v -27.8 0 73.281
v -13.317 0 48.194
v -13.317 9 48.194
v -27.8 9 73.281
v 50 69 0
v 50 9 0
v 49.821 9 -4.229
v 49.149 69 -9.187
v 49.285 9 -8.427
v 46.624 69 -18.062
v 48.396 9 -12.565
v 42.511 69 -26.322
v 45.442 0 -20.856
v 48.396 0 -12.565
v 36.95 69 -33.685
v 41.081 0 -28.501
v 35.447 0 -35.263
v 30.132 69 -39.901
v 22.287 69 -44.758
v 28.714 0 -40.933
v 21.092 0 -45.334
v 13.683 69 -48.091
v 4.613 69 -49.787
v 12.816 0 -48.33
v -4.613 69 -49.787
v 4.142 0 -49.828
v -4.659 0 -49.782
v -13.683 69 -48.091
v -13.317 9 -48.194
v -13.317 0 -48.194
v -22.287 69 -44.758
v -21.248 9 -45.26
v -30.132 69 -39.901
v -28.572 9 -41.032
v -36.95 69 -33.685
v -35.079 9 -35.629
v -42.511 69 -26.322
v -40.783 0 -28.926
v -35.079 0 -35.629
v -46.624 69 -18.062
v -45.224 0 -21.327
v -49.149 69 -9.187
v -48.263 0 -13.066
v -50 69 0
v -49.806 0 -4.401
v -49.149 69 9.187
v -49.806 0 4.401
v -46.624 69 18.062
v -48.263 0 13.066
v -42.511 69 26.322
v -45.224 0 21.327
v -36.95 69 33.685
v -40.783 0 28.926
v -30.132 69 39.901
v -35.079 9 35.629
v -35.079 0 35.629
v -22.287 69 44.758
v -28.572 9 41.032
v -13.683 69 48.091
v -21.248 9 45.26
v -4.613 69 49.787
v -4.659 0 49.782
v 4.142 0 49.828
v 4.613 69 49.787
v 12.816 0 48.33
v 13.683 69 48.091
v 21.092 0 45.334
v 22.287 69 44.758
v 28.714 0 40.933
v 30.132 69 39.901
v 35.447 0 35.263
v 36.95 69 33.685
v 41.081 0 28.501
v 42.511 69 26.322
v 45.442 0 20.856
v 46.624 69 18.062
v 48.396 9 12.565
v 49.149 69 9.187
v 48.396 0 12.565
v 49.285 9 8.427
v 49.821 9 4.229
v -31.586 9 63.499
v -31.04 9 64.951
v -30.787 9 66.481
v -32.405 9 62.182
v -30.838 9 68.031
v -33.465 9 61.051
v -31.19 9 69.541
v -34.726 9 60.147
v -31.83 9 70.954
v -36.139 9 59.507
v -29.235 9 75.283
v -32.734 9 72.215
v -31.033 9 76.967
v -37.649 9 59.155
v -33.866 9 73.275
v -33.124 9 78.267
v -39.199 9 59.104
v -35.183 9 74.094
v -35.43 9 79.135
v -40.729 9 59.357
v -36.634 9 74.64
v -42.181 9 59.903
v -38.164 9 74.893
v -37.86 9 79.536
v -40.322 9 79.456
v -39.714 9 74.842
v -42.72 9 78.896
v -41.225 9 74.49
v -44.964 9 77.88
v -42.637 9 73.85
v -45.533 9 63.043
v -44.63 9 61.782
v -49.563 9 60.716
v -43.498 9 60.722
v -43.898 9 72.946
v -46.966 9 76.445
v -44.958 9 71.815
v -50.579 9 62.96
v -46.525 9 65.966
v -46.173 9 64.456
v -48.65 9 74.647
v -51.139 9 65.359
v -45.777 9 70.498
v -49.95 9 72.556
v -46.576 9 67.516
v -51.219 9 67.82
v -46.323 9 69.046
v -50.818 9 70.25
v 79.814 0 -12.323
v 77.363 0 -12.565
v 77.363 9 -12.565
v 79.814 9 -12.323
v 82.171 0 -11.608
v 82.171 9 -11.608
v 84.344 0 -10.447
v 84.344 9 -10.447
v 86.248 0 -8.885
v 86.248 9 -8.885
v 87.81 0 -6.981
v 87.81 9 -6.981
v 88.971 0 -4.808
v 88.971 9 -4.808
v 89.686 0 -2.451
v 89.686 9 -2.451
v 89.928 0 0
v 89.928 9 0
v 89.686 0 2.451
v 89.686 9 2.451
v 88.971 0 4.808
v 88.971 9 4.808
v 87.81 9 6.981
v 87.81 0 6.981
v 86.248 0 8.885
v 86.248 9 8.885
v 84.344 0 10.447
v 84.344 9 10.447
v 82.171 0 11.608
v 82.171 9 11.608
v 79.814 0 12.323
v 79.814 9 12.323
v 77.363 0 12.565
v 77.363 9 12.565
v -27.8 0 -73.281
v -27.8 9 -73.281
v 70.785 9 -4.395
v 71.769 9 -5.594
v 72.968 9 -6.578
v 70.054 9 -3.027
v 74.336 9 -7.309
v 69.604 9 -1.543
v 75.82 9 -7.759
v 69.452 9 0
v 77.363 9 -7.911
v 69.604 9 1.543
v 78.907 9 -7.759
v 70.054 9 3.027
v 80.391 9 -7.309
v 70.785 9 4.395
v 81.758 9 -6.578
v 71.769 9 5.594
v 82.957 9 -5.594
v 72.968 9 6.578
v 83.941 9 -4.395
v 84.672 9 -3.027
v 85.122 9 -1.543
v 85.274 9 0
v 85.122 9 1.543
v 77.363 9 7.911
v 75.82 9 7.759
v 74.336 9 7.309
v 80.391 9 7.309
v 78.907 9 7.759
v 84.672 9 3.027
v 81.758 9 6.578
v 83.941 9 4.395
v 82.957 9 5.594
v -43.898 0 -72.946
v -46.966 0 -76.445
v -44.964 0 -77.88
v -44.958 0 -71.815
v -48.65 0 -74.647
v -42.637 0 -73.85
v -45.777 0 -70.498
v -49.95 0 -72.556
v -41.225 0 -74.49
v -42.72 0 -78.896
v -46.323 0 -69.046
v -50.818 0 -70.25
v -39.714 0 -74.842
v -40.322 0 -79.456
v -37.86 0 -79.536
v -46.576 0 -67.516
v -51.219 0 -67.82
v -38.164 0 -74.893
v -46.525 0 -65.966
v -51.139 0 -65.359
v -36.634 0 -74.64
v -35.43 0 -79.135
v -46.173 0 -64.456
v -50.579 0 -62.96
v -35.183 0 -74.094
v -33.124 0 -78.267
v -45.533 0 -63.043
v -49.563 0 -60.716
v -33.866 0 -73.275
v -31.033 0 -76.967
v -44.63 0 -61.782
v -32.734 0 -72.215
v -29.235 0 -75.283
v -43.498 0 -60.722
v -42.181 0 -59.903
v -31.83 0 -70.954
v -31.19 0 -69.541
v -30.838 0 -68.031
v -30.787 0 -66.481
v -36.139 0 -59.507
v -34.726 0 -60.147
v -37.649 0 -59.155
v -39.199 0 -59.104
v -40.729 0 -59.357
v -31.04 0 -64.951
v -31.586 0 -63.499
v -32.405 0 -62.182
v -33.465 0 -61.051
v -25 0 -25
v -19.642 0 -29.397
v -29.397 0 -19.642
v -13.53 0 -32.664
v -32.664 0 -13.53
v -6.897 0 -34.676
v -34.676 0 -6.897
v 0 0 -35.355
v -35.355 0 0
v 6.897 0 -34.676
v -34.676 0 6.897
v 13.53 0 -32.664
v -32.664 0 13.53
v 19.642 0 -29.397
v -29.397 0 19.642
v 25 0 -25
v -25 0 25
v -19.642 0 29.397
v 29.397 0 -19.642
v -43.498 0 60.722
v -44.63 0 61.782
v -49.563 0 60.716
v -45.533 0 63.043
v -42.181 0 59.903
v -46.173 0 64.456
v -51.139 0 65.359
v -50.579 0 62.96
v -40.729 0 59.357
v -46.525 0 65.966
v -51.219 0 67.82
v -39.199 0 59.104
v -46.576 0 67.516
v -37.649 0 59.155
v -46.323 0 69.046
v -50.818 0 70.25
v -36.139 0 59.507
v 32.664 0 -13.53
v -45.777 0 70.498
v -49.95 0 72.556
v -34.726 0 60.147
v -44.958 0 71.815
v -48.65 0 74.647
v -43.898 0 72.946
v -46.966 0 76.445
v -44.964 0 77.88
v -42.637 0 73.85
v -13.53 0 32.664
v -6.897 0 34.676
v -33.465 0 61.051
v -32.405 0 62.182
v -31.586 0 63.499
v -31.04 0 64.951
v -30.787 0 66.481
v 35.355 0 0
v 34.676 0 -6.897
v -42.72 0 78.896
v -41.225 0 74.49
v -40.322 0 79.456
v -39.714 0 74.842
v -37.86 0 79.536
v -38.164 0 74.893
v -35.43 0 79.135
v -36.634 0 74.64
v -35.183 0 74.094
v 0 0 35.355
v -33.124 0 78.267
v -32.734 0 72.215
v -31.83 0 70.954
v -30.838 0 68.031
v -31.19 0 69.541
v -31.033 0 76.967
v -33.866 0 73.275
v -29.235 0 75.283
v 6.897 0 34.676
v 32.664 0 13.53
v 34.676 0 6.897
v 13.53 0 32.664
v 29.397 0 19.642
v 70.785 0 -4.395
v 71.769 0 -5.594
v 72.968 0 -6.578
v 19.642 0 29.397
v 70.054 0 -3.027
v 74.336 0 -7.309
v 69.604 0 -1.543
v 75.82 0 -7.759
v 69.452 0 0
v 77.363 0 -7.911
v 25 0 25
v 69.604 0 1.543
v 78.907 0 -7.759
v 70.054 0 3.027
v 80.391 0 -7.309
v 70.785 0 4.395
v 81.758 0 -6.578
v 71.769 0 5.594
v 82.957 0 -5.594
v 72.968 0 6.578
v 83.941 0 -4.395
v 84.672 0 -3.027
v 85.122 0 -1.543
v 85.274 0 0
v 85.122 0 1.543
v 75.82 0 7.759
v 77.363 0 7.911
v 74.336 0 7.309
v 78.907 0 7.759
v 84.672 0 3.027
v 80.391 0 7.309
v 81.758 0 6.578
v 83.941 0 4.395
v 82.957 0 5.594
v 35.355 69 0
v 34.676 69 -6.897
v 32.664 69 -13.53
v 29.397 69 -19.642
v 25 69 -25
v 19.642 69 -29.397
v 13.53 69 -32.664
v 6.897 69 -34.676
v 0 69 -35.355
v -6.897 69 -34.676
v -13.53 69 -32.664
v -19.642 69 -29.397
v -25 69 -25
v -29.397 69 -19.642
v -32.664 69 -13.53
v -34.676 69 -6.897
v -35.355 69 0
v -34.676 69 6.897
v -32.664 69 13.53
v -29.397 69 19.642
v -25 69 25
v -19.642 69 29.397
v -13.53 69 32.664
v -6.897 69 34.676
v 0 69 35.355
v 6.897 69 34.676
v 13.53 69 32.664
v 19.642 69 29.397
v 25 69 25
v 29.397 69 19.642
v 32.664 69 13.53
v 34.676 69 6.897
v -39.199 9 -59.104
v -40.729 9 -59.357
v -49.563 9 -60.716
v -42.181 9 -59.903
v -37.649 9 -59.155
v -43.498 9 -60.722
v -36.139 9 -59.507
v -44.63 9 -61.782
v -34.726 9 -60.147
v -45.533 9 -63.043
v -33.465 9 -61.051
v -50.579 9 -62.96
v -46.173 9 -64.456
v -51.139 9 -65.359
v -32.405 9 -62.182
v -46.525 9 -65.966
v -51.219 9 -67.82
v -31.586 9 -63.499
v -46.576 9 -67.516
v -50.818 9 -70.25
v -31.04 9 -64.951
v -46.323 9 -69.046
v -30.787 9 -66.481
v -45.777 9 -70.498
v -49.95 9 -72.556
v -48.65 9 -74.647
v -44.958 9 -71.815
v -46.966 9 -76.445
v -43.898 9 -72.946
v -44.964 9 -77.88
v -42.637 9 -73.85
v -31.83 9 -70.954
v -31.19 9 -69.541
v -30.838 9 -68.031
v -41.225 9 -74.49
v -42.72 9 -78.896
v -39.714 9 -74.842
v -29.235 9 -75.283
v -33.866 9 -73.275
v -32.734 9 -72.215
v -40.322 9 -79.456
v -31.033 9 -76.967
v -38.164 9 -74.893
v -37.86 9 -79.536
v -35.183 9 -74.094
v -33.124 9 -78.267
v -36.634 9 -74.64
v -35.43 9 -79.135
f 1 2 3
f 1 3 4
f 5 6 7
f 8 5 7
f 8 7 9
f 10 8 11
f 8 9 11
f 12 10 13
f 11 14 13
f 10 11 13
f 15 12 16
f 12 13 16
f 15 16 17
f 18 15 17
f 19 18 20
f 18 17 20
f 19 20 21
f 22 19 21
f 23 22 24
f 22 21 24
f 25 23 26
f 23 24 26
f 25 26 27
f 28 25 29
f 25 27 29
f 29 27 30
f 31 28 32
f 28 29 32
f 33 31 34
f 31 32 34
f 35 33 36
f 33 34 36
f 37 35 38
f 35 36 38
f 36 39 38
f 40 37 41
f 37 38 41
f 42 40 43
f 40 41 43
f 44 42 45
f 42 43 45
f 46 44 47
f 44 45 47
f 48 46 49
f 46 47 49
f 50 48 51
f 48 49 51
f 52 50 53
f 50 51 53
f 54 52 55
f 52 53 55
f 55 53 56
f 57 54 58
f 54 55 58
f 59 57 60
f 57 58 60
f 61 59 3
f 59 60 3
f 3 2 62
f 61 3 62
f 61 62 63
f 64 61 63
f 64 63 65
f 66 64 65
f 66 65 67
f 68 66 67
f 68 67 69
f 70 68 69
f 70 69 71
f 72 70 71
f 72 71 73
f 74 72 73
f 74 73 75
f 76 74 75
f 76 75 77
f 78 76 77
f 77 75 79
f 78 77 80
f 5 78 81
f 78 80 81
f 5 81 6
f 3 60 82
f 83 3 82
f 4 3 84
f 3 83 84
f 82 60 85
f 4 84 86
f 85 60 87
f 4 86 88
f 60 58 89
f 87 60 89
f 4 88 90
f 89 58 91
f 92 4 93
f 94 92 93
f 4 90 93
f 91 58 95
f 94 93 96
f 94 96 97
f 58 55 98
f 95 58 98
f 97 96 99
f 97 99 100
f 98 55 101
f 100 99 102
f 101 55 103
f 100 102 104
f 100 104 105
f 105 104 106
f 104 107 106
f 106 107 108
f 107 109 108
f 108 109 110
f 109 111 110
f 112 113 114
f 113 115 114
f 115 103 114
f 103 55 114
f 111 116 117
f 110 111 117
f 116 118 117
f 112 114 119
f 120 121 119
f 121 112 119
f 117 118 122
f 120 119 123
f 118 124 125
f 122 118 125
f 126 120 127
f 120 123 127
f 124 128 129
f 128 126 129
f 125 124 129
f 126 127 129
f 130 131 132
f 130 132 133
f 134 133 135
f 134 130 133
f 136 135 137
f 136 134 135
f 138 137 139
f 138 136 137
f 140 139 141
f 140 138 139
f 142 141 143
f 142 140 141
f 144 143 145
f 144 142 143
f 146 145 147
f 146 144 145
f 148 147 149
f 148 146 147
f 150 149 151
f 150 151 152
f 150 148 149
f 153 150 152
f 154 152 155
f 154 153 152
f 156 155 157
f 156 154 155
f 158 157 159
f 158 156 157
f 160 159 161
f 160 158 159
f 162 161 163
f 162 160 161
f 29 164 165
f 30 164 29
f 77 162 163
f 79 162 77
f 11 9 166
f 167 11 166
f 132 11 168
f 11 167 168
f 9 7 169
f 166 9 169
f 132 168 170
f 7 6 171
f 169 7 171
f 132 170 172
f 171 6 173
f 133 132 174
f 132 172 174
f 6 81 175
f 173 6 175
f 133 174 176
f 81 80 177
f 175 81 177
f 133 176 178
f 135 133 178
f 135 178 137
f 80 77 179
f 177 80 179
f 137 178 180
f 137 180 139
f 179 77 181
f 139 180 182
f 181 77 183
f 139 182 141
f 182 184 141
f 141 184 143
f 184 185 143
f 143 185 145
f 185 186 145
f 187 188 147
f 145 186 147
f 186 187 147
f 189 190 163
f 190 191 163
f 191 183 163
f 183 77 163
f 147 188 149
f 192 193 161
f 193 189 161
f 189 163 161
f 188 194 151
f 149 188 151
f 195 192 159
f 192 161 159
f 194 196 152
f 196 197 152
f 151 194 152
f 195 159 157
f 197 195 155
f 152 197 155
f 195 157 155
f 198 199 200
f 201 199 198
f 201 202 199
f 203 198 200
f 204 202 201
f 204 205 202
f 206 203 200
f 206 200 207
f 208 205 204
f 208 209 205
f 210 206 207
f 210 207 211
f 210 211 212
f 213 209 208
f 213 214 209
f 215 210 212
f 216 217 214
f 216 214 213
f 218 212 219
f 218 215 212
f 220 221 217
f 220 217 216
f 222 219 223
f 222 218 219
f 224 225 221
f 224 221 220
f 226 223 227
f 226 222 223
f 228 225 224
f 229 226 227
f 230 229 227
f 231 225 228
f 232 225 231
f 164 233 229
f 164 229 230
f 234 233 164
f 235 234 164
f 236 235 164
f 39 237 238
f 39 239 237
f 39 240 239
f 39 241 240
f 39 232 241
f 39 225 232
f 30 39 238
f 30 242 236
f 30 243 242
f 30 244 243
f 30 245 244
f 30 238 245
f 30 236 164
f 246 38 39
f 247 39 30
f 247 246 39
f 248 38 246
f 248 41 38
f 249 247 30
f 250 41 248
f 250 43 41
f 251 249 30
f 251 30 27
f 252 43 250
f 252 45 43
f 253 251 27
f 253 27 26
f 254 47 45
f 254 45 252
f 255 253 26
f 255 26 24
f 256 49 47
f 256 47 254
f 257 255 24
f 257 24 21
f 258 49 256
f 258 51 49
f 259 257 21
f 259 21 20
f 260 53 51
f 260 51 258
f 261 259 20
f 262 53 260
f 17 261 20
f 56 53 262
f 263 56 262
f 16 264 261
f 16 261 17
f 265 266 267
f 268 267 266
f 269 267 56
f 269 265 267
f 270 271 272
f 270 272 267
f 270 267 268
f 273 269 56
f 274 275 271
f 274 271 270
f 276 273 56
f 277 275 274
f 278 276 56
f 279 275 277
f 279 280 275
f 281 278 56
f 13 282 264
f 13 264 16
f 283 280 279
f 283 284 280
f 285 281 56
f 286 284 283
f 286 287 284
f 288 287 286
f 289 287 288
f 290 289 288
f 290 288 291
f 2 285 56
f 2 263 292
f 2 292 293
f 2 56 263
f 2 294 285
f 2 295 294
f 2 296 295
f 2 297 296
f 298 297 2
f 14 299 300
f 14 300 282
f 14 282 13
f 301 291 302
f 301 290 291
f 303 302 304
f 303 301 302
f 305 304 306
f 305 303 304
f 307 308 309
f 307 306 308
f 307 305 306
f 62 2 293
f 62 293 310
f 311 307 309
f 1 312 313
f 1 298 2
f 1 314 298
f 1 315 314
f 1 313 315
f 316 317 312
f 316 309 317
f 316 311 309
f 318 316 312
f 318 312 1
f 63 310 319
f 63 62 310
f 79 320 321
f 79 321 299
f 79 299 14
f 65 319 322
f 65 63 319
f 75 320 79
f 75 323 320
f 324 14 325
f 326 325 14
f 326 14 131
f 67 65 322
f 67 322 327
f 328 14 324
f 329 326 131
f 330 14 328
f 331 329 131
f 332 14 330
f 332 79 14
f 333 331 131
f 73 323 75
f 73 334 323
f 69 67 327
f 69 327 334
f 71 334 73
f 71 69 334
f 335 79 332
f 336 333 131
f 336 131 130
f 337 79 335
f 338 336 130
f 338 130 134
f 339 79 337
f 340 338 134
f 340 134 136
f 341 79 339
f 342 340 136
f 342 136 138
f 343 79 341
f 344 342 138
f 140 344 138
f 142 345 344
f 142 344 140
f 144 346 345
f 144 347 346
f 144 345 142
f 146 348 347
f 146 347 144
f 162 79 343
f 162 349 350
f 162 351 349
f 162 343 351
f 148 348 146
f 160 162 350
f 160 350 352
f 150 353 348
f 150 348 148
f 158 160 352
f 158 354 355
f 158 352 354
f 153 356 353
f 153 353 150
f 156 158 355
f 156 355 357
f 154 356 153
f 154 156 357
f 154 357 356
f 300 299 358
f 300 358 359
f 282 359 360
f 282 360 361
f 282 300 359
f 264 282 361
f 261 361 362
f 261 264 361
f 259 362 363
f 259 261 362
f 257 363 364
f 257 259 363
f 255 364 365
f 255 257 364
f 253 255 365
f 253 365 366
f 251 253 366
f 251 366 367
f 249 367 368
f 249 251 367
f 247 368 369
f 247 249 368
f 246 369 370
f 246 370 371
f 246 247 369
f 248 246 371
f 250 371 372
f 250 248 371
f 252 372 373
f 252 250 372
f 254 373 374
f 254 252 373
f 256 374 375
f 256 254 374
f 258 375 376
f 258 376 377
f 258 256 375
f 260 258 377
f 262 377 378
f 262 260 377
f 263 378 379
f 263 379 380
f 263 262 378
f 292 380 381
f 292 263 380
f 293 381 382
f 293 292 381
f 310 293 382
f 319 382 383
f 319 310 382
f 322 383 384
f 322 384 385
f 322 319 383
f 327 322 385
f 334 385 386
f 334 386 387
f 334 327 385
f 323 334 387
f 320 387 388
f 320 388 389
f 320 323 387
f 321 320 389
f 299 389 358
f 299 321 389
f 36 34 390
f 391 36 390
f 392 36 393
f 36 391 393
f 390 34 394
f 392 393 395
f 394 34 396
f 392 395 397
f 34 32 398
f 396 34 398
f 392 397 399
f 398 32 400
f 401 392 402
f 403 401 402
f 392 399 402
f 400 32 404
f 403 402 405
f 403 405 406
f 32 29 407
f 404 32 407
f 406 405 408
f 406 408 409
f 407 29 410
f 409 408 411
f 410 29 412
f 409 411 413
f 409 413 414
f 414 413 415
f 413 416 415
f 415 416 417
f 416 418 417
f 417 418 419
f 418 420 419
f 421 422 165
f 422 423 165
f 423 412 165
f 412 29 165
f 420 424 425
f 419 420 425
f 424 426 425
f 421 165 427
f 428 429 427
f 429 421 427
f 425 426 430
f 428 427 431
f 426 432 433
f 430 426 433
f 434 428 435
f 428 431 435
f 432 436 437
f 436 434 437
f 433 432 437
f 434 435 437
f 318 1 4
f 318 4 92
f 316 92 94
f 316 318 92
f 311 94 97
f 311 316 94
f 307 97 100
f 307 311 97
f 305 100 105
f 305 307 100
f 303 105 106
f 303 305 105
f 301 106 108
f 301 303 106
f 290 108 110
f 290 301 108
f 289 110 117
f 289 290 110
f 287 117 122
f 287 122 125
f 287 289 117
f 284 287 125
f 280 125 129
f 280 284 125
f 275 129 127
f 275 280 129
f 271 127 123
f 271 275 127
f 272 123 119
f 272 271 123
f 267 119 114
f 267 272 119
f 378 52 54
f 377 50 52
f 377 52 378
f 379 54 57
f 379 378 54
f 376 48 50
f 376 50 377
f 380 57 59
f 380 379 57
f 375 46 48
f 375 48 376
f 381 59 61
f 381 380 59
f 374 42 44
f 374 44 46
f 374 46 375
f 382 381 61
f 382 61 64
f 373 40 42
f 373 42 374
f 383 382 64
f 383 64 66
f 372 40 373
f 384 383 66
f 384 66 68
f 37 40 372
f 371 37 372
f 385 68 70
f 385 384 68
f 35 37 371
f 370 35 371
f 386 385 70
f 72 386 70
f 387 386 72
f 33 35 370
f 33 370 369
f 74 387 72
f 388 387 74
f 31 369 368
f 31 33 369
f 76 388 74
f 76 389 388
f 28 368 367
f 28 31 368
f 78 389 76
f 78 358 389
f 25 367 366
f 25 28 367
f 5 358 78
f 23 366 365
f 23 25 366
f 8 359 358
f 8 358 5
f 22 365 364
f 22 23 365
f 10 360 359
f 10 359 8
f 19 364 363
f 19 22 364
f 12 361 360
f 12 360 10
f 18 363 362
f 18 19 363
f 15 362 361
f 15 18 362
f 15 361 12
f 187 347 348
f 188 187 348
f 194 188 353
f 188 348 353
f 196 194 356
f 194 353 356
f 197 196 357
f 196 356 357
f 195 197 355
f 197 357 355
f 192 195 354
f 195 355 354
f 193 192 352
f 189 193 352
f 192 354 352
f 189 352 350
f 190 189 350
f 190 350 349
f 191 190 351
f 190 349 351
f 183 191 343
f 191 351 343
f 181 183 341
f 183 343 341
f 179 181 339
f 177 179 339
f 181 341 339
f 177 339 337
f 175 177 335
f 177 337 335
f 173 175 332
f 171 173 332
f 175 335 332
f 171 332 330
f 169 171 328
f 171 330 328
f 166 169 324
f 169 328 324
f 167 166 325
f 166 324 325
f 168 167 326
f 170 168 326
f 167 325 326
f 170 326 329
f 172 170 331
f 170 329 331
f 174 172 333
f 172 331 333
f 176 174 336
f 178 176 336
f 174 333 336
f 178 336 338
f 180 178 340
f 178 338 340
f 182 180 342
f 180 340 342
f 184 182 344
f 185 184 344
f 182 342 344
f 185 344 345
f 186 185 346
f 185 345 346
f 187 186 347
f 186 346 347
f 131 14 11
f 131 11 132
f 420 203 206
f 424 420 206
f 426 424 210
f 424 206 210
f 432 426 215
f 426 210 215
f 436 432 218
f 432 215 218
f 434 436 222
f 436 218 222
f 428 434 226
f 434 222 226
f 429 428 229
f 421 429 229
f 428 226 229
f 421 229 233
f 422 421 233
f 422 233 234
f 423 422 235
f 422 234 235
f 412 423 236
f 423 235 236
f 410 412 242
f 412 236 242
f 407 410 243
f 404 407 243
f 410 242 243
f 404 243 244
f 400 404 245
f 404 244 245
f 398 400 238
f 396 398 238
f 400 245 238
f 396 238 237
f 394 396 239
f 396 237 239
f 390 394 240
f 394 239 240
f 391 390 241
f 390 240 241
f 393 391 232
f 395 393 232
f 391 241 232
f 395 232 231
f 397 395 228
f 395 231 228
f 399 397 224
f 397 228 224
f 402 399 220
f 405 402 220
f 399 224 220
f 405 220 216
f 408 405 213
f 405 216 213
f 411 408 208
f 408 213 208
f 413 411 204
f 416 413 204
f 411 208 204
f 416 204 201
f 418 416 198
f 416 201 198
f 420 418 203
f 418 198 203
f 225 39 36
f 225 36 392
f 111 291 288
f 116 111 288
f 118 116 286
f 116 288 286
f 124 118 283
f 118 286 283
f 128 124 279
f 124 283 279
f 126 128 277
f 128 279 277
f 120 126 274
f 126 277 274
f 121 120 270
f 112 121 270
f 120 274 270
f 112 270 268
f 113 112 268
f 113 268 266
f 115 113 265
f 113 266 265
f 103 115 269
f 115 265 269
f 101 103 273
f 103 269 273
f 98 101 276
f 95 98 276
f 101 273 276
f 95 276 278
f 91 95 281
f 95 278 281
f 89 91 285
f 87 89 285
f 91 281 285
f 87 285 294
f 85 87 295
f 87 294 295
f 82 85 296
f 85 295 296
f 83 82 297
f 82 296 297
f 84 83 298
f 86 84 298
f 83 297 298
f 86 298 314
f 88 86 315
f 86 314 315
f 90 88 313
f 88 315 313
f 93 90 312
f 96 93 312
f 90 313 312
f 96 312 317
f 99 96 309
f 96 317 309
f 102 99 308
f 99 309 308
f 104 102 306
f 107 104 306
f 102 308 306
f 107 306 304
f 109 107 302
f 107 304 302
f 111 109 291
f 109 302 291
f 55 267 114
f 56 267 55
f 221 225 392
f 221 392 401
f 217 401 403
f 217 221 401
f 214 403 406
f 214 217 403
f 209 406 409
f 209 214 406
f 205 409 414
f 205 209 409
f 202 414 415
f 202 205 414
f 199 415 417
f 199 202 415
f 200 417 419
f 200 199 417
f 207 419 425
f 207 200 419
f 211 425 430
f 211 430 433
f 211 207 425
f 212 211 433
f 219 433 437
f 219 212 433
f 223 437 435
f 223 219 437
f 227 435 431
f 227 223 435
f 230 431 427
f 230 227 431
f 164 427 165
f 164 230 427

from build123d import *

# Parameters (mm, degrees)
SKETCH1_R           = 50
SKETCH1_R_2         = 35.355339059
BOSS_EXTRUDE1_DEPTH = 69
SKETCH2_R           = 7.911207782
BOSS_EXTRUDE2_DEPTH = 9
CIRPATTERN1_COUNT   = 3


with BuildPart() as part:
    # Sketch1 → Boss-Extrude1 (new body)
    with BuildSketch(Plane(origin=(0, 0, 0), x_dir=(1, 0, 0), z_dir=(0, 1, 0))):
        Circle(SKETCH1_R)
        Circle(SKETCH1_R_2, mode=Mode.SUBTRACT)
    extrude(amount=BOSS_EXTRUDE1_DEPTH)

    # Sketch2 → Boss-Extrude2 (add)
    with BuildSketch(Plane.XZ):
        with BuildLine():
            Line((77.363229747, 12.564610951), (48.395563347, 12.564610951))
            ThreePointArc((48.395563347, 12.564610951), (50, 0), (48.395563347, -12.564610951))
            Line((48.395563347, -12.564610951), (77.363229747, -12.564610951))
            ThreePointArc((77.363229747, -12.564610951), (89.927840698, 0), (77.363229747, 12.564610951))
        make_face()
        with Locations((77.363229747, 0)):
            Circle(SKETCH2_R, mode=Mode.SUBTRACT)
    boss_extrude2 = extrude(amount=-BOSS_EXTRUDE2_DEPTH)

    # CirPattern1: Boss-Extrude2 ×3 about axis
    cirpattern1_axis = Axis((0, -3.45, 0), (0, 1, 0))
    for i in range(1, CIRPATTERN1_COUNT):
        add(boss_extrude2.rotate(cirpattern1_axis, i * 360 / CIRPATTERN1_COUNT))


solid = part.part
